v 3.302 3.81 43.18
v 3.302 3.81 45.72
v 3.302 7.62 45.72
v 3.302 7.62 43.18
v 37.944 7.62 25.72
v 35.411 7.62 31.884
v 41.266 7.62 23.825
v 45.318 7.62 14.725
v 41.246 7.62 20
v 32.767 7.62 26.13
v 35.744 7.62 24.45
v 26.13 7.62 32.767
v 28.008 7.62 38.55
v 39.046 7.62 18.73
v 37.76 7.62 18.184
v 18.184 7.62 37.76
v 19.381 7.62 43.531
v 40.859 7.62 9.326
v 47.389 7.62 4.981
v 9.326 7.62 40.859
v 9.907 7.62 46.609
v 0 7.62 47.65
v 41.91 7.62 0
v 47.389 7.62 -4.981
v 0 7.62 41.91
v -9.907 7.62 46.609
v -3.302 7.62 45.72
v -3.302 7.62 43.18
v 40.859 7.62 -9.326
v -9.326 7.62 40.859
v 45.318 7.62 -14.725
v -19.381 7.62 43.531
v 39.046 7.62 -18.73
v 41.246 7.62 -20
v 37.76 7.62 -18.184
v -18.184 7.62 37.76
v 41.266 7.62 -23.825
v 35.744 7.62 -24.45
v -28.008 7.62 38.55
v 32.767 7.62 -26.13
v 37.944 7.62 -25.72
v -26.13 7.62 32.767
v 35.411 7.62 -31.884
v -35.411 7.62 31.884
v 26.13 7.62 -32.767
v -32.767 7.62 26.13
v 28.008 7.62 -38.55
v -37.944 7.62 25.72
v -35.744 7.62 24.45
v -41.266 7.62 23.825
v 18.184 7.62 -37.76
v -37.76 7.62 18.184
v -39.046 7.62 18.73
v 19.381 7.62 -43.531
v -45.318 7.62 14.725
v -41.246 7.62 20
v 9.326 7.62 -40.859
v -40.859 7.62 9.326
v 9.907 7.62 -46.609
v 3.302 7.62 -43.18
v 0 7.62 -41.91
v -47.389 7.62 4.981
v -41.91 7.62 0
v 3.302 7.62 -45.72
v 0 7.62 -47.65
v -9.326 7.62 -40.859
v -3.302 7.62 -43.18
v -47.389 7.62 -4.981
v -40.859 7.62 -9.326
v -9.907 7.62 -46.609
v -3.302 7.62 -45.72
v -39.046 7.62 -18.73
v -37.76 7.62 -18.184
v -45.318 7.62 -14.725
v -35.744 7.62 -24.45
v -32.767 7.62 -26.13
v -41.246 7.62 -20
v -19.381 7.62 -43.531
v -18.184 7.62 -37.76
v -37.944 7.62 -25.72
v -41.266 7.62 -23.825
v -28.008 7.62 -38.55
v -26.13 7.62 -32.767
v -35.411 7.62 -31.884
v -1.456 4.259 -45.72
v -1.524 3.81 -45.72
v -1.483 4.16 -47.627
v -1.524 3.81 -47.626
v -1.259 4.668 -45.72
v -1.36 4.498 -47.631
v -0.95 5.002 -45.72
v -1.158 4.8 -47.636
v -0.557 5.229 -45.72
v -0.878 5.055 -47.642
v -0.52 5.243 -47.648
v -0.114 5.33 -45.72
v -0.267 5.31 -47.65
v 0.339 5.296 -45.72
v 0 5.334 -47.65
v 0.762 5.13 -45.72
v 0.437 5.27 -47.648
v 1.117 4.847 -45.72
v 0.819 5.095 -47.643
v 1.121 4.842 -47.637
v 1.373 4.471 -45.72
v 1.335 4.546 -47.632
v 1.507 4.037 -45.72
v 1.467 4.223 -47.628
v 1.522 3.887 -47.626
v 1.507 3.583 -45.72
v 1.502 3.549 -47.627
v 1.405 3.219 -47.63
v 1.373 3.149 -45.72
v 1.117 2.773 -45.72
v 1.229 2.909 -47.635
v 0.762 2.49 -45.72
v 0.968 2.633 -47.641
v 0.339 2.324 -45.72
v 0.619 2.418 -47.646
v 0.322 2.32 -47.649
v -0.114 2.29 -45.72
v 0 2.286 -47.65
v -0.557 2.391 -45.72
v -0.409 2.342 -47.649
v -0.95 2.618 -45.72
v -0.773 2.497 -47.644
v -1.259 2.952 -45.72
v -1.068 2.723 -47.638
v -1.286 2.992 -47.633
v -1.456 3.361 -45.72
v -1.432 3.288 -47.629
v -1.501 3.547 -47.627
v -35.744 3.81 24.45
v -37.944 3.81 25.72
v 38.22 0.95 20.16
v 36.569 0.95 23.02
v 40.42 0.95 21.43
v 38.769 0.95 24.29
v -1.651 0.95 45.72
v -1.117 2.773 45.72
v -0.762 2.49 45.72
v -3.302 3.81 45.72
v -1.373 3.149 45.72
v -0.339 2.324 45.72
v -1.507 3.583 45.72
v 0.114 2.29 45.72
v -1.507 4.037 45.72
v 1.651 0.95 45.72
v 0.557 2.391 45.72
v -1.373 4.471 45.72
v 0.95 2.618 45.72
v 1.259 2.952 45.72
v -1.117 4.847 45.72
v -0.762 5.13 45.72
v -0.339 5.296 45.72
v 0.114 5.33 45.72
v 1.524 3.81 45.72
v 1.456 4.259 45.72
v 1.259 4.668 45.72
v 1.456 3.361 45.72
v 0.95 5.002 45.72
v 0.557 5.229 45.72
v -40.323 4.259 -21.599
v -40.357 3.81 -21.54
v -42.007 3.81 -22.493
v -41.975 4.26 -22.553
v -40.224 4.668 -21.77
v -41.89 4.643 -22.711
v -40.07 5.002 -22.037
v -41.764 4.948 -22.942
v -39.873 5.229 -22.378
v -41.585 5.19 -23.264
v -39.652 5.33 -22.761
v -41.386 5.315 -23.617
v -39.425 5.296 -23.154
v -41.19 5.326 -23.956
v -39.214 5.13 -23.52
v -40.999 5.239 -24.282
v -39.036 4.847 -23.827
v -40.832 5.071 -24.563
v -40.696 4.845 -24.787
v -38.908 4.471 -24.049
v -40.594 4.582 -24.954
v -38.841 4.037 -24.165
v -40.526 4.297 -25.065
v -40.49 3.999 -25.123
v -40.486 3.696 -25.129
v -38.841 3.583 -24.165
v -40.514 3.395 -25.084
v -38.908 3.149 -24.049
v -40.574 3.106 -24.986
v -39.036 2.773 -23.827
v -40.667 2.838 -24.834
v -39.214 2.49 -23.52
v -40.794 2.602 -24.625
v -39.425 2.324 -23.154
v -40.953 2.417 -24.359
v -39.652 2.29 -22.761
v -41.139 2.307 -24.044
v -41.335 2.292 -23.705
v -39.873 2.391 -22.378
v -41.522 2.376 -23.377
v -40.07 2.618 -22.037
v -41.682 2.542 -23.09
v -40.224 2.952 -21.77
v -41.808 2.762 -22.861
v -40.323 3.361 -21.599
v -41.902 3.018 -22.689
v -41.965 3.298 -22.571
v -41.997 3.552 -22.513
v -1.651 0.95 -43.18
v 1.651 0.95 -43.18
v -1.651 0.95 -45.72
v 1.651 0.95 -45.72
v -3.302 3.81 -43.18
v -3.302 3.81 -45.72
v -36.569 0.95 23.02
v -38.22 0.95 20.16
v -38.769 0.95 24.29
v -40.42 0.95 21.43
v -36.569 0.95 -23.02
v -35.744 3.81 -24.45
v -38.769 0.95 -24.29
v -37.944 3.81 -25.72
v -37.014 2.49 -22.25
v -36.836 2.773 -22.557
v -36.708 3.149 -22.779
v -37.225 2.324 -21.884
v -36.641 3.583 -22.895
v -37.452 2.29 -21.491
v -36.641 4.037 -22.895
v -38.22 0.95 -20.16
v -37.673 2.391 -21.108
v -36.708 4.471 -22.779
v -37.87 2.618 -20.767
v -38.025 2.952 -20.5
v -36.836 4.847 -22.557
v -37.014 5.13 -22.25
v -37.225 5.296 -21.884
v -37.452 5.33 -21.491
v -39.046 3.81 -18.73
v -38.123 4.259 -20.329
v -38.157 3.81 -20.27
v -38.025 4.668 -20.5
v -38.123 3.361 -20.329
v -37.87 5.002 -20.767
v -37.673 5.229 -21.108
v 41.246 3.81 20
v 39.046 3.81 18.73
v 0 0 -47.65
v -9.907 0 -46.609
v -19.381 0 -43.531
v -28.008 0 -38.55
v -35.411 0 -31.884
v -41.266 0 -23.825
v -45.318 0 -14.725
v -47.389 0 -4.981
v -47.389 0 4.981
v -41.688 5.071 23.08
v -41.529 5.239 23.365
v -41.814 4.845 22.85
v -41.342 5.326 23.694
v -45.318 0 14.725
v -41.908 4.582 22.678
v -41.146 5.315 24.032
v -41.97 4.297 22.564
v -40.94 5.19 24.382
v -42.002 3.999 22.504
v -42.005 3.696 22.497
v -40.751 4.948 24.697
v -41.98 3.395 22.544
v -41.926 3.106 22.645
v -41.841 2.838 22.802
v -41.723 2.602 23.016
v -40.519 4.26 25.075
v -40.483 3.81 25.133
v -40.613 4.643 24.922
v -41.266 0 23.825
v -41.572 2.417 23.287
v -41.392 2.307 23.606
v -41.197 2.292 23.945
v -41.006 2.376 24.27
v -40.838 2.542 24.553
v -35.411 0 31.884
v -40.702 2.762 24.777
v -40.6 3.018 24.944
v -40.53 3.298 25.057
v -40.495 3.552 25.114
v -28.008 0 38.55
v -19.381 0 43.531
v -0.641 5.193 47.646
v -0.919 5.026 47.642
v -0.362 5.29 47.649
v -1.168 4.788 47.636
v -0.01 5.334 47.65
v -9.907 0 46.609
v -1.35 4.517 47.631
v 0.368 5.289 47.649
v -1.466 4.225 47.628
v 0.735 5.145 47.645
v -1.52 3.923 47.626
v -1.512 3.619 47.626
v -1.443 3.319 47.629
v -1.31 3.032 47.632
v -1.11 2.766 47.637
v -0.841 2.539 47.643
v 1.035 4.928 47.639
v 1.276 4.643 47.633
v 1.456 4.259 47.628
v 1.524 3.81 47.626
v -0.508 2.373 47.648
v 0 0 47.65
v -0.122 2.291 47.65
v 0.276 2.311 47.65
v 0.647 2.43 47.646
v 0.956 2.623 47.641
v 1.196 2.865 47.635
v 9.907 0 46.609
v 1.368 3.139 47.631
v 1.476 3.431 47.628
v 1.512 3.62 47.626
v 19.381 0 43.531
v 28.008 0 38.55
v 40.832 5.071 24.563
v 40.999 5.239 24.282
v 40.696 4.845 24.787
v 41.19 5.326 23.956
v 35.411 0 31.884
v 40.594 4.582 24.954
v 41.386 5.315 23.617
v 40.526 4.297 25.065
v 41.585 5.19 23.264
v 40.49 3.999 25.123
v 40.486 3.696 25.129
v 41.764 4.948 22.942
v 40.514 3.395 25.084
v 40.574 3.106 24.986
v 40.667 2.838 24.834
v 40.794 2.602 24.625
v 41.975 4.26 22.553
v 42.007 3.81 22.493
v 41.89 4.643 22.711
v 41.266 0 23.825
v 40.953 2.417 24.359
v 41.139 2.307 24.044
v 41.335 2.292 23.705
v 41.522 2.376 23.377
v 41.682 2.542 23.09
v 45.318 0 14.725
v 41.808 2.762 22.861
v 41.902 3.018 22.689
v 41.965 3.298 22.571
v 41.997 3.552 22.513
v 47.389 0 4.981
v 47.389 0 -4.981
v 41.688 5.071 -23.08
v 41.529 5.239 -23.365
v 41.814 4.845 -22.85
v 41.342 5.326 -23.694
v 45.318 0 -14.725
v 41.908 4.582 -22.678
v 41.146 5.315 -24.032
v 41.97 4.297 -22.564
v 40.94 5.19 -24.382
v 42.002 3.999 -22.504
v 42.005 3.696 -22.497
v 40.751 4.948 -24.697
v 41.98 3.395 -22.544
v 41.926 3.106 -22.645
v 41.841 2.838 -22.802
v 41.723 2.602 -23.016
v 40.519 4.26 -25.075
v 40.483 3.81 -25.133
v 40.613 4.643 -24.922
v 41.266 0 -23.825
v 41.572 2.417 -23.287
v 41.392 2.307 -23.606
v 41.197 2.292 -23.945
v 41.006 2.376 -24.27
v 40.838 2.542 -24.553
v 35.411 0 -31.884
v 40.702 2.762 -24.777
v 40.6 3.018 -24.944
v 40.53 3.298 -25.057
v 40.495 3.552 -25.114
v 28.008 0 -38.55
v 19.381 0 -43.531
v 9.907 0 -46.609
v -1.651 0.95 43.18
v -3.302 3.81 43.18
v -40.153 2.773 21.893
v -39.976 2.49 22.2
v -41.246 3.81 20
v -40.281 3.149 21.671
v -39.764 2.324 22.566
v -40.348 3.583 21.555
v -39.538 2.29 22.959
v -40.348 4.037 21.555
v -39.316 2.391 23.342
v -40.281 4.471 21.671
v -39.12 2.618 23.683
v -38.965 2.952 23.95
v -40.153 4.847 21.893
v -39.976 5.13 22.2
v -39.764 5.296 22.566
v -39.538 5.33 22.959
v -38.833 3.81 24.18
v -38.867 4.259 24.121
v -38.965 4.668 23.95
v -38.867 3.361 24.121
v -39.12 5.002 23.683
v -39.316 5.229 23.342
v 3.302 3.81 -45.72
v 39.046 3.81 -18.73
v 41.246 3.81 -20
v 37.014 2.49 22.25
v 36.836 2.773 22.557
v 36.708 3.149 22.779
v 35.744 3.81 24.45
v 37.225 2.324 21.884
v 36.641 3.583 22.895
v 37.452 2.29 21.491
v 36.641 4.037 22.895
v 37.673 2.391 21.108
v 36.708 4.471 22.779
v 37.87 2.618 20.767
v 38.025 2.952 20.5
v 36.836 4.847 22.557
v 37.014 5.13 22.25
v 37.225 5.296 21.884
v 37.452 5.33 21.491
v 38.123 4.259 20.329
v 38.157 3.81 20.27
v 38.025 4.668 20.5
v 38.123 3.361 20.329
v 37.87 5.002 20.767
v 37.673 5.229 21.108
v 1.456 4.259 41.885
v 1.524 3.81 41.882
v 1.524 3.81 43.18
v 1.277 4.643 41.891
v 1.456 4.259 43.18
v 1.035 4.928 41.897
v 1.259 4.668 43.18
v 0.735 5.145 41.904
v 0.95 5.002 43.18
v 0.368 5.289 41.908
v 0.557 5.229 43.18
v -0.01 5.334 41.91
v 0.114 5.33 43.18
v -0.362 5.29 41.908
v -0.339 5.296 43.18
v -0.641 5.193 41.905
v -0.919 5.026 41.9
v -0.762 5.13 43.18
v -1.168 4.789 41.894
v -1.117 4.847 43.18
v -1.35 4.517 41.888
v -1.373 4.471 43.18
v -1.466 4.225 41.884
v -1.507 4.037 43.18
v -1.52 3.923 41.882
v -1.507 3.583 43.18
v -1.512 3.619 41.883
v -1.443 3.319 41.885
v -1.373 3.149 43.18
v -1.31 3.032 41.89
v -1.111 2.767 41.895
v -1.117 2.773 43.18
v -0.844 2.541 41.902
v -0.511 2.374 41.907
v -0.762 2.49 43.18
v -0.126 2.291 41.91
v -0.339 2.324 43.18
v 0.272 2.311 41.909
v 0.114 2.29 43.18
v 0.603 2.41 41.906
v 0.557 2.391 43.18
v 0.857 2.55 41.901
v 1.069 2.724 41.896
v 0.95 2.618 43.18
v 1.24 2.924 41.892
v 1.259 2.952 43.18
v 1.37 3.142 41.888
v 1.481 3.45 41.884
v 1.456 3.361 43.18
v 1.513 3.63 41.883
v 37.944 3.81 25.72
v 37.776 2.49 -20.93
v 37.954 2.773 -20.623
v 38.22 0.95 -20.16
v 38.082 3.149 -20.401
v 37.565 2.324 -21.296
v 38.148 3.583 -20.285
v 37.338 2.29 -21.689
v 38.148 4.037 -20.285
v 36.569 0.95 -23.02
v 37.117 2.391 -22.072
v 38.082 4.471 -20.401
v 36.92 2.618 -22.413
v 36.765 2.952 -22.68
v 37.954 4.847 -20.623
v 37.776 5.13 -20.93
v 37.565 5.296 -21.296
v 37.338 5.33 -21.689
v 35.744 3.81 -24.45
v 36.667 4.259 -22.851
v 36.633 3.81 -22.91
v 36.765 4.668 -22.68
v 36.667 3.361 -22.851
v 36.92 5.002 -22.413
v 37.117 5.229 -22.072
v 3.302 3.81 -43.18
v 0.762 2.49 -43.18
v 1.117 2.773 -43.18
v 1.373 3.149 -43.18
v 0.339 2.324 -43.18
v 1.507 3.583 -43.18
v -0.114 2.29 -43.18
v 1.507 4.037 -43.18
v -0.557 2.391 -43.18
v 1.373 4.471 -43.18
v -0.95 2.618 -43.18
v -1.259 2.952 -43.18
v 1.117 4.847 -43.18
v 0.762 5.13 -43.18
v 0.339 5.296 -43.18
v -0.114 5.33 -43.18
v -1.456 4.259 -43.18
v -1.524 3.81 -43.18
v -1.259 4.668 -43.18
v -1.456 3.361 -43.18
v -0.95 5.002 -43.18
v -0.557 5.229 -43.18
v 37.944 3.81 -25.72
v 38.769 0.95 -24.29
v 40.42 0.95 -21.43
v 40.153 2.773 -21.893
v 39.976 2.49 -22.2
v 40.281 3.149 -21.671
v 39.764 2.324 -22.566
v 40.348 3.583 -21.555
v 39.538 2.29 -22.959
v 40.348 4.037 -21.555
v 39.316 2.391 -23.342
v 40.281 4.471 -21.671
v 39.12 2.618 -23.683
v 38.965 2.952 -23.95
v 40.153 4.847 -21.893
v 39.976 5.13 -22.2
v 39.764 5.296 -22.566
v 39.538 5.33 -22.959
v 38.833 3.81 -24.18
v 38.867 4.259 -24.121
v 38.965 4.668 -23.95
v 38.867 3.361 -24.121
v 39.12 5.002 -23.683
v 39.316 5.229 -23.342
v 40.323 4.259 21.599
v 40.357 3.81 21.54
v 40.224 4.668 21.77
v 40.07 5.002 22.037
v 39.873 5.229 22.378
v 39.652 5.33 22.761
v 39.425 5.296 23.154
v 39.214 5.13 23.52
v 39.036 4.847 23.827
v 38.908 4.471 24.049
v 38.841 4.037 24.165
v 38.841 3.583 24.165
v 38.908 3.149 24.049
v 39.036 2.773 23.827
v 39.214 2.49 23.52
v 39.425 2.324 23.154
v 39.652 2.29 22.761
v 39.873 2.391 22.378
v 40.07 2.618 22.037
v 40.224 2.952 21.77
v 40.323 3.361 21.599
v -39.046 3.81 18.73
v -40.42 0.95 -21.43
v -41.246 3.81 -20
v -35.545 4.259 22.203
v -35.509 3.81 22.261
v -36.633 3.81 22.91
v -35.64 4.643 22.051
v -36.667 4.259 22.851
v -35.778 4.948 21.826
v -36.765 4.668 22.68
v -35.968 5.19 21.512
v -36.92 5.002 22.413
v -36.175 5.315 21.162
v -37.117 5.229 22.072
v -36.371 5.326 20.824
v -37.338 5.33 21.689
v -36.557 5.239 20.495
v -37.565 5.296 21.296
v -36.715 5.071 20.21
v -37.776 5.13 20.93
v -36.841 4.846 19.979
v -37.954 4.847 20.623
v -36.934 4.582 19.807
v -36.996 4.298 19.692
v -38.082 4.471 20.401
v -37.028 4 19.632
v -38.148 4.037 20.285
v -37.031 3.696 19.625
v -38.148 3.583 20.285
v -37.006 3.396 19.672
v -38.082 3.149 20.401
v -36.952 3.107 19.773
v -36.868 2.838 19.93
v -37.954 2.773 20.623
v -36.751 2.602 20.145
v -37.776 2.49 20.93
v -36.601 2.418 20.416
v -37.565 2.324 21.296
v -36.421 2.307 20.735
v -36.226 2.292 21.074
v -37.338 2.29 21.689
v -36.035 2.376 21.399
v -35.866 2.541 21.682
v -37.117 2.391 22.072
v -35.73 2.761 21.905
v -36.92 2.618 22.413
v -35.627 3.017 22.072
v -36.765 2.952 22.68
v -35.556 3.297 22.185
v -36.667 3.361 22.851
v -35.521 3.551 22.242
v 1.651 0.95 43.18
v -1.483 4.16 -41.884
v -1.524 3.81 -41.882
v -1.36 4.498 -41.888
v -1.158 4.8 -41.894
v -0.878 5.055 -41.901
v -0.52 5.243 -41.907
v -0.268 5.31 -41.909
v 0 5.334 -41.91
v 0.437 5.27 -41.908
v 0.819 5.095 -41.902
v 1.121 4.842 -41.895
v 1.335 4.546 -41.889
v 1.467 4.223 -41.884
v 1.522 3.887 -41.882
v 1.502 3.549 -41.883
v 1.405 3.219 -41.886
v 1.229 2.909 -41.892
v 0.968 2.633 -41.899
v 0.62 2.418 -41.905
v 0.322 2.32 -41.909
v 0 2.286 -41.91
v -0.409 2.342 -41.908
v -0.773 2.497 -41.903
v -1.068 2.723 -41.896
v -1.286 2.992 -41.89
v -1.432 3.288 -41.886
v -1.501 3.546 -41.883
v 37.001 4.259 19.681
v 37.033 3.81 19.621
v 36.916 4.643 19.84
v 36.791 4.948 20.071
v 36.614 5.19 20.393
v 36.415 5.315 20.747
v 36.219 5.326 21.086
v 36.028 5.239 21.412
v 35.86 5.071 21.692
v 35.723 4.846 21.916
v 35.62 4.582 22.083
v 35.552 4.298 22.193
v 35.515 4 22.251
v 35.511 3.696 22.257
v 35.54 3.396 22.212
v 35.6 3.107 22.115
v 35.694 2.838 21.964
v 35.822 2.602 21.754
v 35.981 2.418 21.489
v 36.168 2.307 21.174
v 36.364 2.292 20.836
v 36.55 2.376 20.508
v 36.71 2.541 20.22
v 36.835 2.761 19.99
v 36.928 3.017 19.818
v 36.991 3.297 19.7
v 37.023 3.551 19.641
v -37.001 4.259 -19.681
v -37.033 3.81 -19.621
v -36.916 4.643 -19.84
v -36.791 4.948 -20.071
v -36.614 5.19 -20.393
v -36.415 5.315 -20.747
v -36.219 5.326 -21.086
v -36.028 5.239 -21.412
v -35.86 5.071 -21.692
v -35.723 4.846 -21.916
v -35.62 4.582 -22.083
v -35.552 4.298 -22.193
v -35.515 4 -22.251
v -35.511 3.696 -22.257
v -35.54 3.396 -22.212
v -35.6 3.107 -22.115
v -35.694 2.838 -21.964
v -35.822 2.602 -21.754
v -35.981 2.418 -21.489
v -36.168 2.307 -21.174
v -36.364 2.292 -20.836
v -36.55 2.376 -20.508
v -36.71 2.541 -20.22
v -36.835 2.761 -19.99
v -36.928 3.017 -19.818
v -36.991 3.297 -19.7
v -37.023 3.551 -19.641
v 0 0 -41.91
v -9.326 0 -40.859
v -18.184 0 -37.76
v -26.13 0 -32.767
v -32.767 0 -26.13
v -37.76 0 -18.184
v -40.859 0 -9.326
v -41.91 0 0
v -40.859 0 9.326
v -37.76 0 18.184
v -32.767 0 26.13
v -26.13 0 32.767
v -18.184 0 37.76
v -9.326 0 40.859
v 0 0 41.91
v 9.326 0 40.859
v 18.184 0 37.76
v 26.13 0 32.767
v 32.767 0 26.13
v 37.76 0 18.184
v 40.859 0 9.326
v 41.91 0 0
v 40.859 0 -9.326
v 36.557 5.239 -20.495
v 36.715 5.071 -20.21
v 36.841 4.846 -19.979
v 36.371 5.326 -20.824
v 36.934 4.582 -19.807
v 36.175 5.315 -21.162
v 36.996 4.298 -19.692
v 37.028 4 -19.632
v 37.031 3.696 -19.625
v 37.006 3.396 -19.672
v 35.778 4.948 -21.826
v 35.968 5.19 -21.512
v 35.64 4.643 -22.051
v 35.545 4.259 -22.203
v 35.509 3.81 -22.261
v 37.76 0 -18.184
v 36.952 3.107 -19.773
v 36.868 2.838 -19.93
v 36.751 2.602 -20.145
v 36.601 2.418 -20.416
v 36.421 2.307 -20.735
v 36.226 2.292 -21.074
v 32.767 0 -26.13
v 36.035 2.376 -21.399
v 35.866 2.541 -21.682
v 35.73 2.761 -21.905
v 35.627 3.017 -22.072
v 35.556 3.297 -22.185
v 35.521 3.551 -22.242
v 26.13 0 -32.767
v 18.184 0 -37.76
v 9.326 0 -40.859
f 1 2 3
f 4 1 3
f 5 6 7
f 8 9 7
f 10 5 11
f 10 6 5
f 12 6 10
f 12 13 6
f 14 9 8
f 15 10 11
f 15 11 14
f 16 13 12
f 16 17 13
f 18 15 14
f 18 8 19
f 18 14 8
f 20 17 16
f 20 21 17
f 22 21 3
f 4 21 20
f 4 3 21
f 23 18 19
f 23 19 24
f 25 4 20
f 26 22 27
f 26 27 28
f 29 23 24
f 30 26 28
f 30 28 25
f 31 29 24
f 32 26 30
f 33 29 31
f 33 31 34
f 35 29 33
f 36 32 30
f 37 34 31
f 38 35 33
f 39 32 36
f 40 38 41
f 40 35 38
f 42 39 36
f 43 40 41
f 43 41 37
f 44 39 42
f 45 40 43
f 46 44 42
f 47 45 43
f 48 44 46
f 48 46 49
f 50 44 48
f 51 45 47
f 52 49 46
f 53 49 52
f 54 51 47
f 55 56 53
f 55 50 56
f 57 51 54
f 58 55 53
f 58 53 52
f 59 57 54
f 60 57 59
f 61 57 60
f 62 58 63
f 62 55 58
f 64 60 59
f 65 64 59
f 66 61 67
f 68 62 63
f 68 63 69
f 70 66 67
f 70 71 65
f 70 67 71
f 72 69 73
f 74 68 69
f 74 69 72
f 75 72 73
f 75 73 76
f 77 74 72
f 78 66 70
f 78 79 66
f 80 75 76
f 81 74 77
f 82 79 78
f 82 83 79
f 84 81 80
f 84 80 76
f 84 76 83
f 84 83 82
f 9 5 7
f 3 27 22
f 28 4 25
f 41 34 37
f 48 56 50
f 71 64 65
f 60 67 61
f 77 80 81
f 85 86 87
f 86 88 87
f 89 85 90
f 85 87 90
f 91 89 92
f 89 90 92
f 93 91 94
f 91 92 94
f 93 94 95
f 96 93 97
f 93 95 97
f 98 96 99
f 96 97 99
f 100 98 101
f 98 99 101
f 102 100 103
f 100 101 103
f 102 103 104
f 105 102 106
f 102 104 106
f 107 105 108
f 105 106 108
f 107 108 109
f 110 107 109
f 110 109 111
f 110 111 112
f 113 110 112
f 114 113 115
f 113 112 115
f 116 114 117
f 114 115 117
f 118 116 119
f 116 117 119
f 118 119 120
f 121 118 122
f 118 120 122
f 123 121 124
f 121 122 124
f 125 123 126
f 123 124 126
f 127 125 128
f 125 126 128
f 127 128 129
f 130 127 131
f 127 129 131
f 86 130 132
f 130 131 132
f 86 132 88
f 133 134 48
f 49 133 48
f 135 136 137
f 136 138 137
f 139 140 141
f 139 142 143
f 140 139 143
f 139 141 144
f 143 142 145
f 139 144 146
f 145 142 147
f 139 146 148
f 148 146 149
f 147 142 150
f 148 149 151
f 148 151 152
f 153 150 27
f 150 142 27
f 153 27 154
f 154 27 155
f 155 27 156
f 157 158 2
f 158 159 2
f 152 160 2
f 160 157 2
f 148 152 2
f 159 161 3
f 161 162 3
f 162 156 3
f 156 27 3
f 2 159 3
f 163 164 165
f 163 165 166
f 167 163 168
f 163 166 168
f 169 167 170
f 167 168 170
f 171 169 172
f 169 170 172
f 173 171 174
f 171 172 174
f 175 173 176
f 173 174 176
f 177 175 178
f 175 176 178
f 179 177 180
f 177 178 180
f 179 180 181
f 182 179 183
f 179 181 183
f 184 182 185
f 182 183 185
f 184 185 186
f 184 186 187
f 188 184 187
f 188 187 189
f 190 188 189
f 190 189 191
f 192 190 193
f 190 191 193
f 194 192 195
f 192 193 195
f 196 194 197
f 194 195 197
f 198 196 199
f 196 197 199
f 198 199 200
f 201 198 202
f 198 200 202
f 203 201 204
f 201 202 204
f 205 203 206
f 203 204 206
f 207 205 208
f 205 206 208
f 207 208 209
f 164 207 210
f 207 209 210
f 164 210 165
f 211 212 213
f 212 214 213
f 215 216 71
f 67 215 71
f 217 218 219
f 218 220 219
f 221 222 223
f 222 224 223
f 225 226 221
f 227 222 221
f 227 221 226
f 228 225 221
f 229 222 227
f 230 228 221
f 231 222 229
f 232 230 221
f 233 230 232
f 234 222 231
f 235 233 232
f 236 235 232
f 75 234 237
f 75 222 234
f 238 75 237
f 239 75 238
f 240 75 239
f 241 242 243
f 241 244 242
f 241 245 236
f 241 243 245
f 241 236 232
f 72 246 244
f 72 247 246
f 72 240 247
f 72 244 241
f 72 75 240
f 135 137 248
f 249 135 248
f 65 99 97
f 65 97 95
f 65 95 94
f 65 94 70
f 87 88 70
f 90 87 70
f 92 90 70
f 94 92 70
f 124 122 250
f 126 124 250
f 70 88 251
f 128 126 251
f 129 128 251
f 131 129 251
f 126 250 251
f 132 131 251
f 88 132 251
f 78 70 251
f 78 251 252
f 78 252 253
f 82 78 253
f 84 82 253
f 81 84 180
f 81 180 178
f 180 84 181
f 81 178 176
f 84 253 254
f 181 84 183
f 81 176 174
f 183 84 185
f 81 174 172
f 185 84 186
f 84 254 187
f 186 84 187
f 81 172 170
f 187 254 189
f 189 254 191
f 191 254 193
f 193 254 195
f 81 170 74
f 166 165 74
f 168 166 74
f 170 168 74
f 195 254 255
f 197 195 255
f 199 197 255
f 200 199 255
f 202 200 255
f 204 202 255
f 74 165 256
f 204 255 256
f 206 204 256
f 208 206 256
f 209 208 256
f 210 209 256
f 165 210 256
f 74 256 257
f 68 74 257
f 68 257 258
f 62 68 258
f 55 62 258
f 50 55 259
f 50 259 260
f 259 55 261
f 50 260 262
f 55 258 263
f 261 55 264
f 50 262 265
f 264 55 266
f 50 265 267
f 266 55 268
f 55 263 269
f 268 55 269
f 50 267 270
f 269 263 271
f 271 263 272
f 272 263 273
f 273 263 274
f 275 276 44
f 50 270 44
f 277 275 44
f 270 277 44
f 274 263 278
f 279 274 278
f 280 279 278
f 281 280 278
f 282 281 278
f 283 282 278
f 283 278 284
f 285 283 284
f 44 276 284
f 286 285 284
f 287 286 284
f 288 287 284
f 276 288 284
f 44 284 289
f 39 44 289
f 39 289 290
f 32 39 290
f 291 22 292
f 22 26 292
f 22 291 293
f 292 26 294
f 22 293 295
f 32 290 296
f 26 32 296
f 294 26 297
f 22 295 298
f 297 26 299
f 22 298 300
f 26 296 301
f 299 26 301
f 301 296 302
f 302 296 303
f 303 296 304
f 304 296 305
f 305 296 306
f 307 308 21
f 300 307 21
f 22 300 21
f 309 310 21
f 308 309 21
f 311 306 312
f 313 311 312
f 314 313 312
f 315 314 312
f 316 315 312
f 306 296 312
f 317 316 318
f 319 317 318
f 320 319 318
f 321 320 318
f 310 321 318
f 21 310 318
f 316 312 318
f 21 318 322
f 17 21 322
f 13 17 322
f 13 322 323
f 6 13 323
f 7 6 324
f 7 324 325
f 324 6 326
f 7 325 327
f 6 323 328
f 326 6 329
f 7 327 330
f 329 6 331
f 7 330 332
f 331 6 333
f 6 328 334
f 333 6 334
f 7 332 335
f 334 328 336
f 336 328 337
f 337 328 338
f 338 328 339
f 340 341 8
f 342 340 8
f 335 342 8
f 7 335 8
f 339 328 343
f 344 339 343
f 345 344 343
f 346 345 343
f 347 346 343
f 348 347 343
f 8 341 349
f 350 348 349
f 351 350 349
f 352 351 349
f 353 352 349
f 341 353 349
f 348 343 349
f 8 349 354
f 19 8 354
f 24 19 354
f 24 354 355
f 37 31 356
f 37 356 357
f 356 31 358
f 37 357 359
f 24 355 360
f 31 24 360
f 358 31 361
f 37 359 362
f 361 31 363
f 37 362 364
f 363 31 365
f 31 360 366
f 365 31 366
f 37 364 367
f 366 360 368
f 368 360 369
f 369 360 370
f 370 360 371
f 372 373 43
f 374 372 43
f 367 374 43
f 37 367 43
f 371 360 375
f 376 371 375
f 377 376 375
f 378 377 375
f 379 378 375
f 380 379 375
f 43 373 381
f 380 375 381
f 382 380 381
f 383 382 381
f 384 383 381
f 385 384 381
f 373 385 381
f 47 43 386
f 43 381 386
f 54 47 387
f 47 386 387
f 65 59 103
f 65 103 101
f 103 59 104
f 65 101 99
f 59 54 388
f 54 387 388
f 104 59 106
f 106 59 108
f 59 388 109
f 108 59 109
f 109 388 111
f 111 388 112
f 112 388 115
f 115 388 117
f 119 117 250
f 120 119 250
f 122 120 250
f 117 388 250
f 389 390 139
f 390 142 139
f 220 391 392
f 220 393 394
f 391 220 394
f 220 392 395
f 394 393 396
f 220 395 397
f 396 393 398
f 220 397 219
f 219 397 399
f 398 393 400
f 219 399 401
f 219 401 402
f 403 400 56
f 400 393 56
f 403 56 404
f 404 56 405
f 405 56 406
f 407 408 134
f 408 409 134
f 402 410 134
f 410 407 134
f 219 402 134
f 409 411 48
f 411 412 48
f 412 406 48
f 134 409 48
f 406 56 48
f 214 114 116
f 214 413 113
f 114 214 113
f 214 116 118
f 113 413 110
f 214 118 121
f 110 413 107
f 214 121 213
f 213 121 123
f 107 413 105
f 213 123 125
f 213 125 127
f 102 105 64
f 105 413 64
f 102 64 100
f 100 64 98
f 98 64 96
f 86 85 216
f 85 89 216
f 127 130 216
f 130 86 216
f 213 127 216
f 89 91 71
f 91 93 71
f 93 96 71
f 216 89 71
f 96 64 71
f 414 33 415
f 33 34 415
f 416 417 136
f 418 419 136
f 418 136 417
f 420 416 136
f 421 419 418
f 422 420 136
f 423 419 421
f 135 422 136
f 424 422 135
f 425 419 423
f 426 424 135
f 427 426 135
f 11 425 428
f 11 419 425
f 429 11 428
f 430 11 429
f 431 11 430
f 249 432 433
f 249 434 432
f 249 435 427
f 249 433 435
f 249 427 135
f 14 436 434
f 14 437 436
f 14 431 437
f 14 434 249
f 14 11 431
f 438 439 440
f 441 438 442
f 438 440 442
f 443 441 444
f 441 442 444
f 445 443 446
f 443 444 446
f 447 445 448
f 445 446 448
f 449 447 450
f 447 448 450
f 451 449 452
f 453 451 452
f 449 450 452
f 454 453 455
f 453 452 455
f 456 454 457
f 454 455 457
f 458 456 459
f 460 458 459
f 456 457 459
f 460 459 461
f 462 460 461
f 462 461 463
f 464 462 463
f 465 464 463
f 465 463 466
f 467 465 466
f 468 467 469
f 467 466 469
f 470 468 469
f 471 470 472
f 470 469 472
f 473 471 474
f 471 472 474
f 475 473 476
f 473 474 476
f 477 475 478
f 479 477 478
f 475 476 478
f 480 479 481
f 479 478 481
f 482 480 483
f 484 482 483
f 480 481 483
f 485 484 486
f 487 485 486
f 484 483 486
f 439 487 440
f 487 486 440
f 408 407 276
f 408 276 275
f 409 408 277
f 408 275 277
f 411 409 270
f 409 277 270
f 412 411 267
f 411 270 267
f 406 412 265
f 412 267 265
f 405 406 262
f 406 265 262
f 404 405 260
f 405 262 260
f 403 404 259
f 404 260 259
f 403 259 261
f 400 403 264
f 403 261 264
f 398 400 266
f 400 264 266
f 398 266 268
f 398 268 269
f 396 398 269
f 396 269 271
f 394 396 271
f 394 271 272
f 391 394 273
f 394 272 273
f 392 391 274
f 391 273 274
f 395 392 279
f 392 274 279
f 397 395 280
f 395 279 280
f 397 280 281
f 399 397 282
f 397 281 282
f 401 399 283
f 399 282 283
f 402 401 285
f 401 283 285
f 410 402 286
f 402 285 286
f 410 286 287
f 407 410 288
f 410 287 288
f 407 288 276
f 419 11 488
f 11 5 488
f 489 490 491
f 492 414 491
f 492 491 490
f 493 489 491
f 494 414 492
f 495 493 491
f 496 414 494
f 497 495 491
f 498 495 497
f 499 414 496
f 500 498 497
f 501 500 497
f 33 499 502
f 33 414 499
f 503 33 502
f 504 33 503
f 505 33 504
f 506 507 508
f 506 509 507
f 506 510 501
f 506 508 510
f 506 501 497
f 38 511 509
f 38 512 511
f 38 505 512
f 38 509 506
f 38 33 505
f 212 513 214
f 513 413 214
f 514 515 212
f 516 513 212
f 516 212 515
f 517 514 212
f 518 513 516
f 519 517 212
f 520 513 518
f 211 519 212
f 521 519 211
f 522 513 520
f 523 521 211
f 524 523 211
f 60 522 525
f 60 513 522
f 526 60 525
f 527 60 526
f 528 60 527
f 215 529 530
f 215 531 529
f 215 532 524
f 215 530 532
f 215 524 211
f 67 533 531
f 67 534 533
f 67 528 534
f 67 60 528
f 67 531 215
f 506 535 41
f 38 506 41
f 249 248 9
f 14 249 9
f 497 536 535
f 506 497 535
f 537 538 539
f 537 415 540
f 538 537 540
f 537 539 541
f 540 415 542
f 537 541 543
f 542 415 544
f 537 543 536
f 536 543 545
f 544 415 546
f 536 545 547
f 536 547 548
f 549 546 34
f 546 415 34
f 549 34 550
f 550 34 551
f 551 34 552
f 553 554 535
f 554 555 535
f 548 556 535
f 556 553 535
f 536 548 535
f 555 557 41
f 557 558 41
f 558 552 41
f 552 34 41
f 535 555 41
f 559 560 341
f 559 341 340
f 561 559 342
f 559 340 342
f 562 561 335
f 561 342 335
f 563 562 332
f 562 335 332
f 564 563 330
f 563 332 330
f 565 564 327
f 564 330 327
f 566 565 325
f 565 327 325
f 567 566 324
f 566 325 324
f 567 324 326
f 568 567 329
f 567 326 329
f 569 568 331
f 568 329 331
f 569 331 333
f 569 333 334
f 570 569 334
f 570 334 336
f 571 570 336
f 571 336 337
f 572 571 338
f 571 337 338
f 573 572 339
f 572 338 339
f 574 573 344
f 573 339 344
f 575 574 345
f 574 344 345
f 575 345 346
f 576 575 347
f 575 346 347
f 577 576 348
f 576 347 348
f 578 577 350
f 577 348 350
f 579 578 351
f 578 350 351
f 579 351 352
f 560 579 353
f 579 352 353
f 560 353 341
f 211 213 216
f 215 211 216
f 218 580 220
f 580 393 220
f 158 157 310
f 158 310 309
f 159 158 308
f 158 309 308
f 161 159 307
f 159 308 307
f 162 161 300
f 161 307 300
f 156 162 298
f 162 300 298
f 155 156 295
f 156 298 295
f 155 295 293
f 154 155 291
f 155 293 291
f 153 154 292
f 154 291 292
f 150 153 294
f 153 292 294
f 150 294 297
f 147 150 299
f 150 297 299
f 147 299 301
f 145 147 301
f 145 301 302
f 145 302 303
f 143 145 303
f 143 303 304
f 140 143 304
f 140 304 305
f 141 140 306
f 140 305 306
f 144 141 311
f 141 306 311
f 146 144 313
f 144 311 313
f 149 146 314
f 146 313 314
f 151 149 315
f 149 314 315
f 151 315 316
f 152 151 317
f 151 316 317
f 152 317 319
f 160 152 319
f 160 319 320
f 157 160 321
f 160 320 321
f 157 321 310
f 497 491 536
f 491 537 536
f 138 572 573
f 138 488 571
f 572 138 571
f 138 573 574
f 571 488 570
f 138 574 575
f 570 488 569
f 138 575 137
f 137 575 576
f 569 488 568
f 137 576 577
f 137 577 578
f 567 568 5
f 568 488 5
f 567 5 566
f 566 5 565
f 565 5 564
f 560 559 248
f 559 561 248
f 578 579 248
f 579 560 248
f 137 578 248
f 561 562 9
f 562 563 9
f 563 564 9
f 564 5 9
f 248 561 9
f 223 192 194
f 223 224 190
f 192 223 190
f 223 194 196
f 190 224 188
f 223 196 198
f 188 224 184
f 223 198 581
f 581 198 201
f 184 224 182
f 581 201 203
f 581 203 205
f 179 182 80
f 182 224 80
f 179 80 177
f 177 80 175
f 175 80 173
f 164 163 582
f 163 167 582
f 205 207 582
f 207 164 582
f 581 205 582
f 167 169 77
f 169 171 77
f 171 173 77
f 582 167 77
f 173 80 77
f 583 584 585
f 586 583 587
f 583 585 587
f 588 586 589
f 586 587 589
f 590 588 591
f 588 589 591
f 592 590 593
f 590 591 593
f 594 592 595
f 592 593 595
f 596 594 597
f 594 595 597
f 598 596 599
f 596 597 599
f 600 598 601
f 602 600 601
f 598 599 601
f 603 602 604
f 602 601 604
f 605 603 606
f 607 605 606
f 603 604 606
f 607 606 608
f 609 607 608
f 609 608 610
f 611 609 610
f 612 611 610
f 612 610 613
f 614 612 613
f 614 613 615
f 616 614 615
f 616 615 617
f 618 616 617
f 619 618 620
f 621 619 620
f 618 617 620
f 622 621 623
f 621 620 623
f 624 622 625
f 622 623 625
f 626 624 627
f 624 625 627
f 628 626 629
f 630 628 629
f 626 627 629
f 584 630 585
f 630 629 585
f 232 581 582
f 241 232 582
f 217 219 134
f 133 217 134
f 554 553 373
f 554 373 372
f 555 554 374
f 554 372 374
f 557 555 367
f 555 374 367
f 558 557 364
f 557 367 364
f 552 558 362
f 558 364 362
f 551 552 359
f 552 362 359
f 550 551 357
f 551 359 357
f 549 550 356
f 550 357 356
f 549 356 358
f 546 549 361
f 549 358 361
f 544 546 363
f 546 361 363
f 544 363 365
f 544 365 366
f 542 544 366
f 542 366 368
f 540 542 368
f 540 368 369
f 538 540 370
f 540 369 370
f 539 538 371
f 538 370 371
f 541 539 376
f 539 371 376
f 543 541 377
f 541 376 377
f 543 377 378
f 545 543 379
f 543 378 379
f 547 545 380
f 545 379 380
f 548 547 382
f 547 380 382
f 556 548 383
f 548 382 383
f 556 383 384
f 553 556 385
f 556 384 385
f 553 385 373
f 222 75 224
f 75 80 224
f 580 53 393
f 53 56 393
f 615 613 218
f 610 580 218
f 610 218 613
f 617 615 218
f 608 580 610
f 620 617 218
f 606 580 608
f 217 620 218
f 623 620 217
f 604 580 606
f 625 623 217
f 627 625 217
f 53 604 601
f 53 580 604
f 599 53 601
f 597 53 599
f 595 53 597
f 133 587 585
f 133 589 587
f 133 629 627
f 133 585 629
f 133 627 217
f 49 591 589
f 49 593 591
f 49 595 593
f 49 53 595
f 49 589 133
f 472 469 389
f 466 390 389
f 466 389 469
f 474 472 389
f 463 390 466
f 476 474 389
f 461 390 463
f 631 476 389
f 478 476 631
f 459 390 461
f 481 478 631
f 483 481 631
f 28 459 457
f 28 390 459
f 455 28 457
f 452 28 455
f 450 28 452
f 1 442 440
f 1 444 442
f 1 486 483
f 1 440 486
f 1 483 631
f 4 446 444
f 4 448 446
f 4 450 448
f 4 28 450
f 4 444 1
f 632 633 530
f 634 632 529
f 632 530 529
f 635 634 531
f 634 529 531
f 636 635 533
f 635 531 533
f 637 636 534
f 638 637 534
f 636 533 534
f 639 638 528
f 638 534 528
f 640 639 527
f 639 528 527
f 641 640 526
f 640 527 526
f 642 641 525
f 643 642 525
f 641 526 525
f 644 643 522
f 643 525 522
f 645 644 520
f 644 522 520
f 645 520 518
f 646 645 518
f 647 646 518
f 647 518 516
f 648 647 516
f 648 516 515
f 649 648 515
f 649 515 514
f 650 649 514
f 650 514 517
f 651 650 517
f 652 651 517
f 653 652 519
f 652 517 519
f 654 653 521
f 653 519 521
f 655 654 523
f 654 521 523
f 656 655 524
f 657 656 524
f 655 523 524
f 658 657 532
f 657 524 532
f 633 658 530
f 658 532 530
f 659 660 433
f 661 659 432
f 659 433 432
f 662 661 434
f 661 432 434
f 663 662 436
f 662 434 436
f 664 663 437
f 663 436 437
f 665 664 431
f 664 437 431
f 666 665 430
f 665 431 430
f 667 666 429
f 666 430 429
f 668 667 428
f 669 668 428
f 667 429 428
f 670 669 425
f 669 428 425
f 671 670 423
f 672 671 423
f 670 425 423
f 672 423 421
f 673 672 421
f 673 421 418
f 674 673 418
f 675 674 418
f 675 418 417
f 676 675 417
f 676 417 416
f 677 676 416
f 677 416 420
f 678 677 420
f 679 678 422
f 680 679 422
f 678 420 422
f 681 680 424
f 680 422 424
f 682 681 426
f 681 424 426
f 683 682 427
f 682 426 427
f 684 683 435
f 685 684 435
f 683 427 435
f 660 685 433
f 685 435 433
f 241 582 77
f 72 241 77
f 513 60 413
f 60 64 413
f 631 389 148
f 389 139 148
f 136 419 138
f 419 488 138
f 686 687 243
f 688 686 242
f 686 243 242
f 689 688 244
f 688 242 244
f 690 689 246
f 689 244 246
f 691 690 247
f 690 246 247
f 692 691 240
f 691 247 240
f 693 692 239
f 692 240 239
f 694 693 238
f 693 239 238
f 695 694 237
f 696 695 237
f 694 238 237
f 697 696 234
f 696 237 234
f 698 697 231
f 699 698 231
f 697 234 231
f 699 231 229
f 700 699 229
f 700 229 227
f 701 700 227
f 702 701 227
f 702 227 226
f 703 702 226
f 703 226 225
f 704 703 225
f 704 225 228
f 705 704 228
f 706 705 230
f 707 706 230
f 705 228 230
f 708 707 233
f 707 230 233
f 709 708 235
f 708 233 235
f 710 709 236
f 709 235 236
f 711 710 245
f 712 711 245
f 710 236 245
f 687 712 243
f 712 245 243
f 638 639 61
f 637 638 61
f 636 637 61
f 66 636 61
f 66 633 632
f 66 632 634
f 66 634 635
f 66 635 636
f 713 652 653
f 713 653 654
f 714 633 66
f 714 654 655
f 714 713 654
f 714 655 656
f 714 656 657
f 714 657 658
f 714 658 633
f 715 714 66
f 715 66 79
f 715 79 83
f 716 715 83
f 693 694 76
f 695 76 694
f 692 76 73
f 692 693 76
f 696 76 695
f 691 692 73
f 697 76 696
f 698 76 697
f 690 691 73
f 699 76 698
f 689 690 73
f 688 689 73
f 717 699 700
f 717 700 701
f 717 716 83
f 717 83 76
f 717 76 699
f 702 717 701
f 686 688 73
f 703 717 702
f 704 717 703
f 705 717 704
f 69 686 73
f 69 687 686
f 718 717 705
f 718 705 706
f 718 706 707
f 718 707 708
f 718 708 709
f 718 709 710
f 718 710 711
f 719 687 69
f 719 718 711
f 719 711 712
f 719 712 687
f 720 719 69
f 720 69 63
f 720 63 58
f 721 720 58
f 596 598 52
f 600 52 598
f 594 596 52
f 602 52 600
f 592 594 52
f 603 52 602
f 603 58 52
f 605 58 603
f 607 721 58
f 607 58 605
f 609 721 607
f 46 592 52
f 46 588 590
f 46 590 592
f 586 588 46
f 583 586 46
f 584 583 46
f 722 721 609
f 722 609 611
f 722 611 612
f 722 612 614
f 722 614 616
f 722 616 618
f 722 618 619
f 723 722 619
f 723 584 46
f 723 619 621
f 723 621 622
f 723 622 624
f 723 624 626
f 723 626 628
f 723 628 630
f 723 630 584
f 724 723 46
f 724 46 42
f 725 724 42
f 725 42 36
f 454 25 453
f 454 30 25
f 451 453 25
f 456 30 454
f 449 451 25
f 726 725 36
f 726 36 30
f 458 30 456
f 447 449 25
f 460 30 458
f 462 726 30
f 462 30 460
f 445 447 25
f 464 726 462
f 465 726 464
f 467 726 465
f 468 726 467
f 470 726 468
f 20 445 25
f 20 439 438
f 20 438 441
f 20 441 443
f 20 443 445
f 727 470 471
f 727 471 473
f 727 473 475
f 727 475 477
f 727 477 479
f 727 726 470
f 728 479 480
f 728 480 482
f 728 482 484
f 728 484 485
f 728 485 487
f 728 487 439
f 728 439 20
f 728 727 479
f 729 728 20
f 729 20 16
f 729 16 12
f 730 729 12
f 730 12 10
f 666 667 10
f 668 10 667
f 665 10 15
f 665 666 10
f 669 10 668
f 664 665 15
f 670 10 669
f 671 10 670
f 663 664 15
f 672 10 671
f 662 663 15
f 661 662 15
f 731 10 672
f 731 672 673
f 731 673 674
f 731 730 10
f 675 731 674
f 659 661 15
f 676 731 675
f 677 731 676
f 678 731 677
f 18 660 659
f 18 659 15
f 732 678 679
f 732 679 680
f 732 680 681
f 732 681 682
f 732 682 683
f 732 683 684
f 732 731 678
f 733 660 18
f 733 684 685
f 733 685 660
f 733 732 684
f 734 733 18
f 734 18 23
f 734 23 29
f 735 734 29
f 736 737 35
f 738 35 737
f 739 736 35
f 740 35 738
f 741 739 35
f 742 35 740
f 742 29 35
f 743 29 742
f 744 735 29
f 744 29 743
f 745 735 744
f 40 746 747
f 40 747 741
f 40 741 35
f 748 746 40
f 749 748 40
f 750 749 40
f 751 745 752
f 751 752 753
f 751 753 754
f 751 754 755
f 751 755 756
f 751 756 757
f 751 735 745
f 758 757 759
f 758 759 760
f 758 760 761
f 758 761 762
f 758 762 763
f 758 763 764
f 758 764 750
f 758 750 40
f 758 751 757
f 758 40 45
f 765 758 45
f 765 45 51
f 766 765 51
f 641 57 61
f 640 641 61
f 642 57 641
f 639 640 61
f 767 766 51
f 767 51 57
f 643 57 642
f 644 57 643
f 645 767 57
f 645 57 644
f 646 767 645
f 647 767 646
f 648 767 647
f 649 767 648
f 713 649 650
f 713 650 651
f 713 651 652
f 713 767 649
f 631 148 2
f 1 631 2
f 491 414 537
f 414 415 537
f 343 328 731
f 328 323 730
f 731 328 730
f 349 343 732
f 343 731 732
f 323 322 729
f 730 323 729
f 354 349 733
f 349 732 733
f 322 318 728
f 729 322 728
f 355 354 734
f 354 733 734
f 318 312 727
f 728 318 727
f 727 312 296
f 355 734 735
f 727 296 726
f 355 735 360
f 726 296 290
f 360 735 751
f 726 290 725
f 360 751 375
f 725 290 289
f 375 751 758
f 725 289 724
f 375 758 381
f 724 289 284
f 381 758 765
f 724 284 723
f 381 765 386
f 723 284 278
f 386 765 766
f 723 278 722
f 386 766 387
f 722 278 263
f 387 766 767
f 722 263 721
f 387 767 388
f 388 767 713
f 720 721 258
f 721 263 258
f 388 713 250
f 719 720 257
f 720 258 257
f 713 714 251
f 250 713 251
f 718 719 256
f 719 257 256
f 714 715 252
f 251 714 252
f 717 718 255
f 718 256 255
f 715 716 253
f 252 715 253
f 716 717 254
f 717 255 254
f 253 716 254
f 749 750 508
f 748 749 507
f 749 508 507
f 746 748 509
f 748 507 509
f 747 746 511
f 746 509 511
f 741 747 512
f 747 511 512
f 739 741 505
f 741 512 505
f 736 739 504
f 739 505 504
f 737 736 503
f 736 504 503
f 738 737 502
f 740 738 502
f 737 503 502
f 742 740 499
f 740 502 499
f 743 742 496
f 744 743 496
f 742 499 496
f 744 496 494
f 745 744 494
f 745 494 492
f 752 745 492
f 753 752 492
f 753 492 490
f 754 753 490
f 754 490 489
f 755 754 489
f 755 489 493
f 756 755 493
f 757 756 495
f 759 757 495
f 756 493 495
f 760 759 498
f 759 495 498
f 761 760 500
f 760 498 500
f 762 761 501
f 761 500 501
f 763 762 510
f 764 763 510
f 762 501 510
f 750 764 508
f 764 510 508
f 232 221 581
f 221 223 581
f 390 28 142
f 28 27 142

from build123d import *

# Parameters (mm, degrees)
SKETCH2_R           = 47.6504
SKETCH2_R_2         = 41.91
BOSS_EXTRUDE1_DEPTH = 7.62
CUT_EXTRUDE1_DEPTH  = 1.27
SKETCH6_R           = 1.524
CUT_EXTRUDE2_DEPTH  = 6.223
CIRPATTERN1_COUNT   = 6


with BuildPart() as part:
    # Sketch2 → Boss-Extrude1 (new body)
    with BuildSketch(Plane(origin=(0, 0, 0), x_dir=(1, 0, 0), z_dir=(0, 1, 0))):
        with Locations(Location((0, 0, 0), (0, 0, 90))):
            Circle(SKETCH2_R)
        with Locations(Location((0, 0, 0), (0, 0, 90))):
            Circle(SKETCH2_R_2, mode=Mode.SUBTRACT)
    extrude(amount=BOSS_EXTRUDE1_DEPTH)

    # Sketch4 → Cut-Extrude1 (cut, symmetric)
    with BuildSketch(Plane.XY.offset(44.45)):
        Polygon((-1.651, 0.950384117), (0, 0.950384117), (0, 6.669615883), (-1.651, 6.669615883), (-3.302, 3.81), align=None)
        Polygon((0, 6.669615883), (0, 0.950384117), (1.651, 0.950384117), (3.302, 3.81), (1.651, 6.669615883), align=None)
        Polygon((0, 7.62), (0, 6.669615883), (1.651, 6.669615883), (3.302, 3.81), (3.302, 7.62), align=None)
        Polygon((-1.651, 6.669615883), (0, 6.669615883), (0, 7.62), (-3.302, 7.62), (-3.302, 3.81), align=None)
    cut_extrude1 = extrude(amount=CUT_EXTRUDE1_DEPTH, both=True, mode=Mode.SUBTRACT)

    # Sketch6 → Cut-Extrude2 (cut, symmetric)
    with BuildSketch(Plane.XY.offset(44.45)):
        with Locations((0, 3.81)):
            Circle(SKETCH6_R)
    cut_extrude2 = extrude(amount=CUT_EXTRUDE2_DEPTH, both=True, mode=Mode.SUBTRACT)

    # CirPattern1: Cut-Extrude1, Cut-Extrude2 ×6 about axis
    cirpattern1_axis = Axis((0, 0, 0), (0, 1, 0))
    add([cut_extrude1.rotate(cirpattern1_axis, i * 360 / CIRPATTERN1_COUNT) for i in range(1, CIRPATTERN1_COUNT)], mode=Mode.SUBTRACT)
    add([cut_extrude2.rotate(cirpattern1_axis, i * 360 / CIRPATTERN1_COUNT) for i in range(1, CIRPATTERN1_COUNT)], mode=Mode.SUBTRACT)


solid = part.part
